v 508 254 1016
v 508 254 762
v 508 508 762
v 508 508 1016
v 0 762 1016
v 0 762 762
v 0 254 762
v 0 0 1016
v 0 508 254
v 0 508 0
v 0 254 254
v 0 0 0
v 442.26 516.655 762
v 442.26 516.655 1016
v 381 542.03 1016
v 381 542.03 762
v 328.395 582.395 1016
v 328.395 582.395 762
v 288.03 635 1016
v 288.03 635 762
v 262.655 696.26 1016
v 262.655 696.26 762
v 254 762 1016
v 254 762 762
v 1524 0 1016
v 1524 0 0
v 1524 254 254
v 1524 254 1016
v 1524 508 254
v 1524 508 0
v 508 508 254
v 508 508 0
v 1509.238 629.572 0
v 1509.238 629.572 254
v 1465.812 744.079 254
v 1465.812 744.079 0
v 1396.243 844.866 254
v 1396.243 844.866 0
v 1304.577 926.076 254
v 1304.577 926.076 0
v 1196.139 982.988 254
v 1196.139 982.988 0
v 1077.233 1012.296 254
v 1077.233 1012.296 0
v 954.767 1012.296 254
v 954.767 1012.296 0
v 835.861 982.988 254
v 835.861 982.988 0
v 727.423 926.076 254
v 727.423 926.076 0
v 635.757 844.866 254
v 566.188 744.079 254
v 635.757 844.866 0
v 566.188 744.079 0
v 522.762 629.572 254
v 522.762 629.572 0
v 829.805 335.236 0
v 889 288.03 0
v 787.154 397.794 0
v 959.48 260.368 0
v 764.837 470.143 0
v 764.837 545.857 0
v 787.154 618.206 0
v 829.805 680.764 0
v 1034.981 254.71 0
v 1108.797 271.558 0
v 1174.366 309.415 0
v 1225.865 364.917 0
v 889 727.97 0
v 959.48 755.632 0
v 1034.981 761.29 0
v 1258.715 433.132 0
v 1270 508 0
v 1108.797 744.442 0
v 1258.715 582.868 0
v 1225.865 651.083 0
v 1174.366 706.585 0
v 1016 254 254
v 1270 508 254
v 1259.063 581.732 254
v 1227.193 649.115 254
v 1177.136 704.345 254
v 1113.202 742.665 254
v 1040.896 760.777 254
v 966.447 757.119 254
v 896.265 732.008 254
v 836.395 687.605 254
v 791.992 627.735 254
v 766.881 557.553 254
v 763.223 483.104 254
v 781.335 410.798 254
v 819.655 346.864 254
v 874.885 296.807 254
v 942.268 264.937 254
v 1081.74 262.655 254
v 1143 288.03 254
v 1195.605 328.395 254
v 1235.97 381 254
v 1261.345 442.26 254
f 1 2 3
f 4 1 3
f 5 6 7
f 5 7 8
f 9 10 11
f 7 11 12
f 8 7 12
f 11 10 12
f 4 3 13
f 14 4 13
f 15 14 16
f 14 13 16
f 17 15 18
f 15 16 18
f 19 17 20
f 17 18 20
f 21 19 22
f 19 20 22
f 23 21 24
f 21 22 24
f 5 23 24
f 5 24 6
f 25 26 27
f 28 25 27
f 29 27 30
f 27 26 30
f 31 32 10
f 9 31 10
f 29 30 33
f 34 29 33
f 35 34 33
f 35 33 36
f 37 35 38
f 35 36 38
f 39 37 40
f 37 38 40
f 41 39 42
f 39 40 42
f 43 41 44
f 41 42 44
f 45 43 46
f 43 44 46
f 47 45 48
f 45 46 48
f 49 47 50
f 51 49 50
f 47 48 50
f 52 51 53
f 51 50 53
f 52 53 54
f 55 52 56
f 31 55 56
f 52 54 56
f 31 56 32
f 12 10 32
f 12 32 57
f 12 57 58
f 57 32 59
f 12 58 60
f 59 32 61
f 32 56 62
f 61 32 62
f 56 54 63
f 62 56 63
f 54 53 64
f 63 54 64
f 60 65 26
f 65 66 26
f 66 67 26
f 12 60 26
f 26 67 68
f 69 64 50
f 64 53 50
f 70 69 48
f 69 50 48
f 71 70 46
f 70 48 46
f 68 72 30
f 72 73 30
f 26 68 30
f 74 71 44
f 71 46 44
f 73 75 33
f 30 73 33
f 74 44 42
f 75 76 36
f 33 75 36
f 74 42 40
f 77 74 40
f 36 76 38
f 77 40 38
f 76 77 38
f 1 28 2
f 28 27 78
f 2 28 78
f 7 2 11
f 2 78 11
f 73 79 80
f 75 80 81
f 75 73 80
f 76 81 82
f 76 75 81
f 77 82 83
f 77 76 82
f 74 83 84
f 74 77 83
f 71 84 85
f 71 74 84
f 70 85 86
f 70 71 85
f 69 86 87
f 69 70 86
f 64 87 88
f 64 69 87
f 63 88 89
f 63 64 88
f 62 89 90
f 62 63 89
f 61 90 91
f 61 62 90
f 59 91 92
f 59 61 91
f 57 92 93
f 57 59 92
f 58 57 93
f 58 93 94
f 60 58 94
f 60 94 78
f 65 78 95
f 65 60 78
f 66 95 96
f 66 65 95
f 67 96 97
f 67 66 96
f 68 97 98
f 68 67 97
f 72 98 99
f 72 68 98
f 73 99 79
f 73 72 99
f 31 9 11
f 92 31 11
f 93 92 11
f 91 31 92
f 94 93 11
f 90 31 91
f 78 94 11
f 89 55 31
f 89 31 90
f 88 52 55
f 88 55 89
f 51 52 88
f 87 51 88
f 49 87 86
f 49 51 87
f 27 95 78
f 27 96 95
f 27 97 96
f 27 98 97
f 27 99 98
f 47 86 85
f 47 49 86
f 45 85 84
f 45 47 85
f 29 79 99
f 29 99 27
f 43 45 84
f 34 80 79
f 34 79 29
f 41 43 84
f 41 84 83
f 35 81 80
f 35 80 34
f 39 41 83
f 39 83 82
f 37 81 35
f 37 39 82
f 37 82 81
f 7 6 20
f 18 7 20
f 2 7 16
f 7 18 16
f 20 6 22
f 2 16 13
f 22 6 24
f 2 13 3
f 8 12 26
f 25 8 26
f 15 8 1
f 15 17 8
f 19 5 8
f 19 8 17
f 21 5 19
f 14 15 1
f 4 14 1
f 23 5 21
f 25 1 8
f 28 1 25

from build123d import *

# Parameters (mm, degrees)
SKETCH1_R           = 254
BOSS_EXTRUDE3_DEPTH = 254
BOSS_EXTRUDE4_DEPTH = 1016
BOSS_EXTRUDE5_START = 762
BOSS_EXTRUDE5_DEPTH = 254


with BuildPart() as part:
    # Sketch1 → Boss-Extrude3 (new body)
    with BuildSketch(Plane.XY):
        with BuildLine():
            Line((0, 0), (1524, 0))
            Line((1524, 0), (1524, 508))
            ThreePointArc((1524, 508), (1016, 1016), (508, 508))
            Line((508, 508), (0, 508))
            Line((0, 508), (0, 0))
        make_face()
        with Locations((1016, 508)):
            Circle(SKETCH1_R, mode=Mode.SUBTRACT)
    extrude(amount=BOSS_EXTRUDE3_DEPTH)

    # Sketch1<8> → Boss-Extrude4 (add)
    with BuildSketch(Plane.XY):
        Polygon((0, 254), (0, 0), (1524, 0), (1524, 254), (1016, 254), (508, 254), align=None)
    extrude(amount=BOSS_EXTRUDE4_DEPTH)

    # Sketch1<9> → Boss-Extrude5 (add)
    with BuildSketch(Plane.XY.offset(BOSS_EXTRUDE5_START)):
        with BuildLine():
            Line((0, 254), (508, 254))
            Line((508, 254), (508, 508))
            ThreePointArc((508, 508), (328.394877579, 582.394877579), (254, 762))
            Line((254, 762), (0, 762))
            Line((0, 762), (0, 254))
        make_face()
    extrude(amount=BOSS_EXTRUDE5_DEPTH)


solid = part.part
